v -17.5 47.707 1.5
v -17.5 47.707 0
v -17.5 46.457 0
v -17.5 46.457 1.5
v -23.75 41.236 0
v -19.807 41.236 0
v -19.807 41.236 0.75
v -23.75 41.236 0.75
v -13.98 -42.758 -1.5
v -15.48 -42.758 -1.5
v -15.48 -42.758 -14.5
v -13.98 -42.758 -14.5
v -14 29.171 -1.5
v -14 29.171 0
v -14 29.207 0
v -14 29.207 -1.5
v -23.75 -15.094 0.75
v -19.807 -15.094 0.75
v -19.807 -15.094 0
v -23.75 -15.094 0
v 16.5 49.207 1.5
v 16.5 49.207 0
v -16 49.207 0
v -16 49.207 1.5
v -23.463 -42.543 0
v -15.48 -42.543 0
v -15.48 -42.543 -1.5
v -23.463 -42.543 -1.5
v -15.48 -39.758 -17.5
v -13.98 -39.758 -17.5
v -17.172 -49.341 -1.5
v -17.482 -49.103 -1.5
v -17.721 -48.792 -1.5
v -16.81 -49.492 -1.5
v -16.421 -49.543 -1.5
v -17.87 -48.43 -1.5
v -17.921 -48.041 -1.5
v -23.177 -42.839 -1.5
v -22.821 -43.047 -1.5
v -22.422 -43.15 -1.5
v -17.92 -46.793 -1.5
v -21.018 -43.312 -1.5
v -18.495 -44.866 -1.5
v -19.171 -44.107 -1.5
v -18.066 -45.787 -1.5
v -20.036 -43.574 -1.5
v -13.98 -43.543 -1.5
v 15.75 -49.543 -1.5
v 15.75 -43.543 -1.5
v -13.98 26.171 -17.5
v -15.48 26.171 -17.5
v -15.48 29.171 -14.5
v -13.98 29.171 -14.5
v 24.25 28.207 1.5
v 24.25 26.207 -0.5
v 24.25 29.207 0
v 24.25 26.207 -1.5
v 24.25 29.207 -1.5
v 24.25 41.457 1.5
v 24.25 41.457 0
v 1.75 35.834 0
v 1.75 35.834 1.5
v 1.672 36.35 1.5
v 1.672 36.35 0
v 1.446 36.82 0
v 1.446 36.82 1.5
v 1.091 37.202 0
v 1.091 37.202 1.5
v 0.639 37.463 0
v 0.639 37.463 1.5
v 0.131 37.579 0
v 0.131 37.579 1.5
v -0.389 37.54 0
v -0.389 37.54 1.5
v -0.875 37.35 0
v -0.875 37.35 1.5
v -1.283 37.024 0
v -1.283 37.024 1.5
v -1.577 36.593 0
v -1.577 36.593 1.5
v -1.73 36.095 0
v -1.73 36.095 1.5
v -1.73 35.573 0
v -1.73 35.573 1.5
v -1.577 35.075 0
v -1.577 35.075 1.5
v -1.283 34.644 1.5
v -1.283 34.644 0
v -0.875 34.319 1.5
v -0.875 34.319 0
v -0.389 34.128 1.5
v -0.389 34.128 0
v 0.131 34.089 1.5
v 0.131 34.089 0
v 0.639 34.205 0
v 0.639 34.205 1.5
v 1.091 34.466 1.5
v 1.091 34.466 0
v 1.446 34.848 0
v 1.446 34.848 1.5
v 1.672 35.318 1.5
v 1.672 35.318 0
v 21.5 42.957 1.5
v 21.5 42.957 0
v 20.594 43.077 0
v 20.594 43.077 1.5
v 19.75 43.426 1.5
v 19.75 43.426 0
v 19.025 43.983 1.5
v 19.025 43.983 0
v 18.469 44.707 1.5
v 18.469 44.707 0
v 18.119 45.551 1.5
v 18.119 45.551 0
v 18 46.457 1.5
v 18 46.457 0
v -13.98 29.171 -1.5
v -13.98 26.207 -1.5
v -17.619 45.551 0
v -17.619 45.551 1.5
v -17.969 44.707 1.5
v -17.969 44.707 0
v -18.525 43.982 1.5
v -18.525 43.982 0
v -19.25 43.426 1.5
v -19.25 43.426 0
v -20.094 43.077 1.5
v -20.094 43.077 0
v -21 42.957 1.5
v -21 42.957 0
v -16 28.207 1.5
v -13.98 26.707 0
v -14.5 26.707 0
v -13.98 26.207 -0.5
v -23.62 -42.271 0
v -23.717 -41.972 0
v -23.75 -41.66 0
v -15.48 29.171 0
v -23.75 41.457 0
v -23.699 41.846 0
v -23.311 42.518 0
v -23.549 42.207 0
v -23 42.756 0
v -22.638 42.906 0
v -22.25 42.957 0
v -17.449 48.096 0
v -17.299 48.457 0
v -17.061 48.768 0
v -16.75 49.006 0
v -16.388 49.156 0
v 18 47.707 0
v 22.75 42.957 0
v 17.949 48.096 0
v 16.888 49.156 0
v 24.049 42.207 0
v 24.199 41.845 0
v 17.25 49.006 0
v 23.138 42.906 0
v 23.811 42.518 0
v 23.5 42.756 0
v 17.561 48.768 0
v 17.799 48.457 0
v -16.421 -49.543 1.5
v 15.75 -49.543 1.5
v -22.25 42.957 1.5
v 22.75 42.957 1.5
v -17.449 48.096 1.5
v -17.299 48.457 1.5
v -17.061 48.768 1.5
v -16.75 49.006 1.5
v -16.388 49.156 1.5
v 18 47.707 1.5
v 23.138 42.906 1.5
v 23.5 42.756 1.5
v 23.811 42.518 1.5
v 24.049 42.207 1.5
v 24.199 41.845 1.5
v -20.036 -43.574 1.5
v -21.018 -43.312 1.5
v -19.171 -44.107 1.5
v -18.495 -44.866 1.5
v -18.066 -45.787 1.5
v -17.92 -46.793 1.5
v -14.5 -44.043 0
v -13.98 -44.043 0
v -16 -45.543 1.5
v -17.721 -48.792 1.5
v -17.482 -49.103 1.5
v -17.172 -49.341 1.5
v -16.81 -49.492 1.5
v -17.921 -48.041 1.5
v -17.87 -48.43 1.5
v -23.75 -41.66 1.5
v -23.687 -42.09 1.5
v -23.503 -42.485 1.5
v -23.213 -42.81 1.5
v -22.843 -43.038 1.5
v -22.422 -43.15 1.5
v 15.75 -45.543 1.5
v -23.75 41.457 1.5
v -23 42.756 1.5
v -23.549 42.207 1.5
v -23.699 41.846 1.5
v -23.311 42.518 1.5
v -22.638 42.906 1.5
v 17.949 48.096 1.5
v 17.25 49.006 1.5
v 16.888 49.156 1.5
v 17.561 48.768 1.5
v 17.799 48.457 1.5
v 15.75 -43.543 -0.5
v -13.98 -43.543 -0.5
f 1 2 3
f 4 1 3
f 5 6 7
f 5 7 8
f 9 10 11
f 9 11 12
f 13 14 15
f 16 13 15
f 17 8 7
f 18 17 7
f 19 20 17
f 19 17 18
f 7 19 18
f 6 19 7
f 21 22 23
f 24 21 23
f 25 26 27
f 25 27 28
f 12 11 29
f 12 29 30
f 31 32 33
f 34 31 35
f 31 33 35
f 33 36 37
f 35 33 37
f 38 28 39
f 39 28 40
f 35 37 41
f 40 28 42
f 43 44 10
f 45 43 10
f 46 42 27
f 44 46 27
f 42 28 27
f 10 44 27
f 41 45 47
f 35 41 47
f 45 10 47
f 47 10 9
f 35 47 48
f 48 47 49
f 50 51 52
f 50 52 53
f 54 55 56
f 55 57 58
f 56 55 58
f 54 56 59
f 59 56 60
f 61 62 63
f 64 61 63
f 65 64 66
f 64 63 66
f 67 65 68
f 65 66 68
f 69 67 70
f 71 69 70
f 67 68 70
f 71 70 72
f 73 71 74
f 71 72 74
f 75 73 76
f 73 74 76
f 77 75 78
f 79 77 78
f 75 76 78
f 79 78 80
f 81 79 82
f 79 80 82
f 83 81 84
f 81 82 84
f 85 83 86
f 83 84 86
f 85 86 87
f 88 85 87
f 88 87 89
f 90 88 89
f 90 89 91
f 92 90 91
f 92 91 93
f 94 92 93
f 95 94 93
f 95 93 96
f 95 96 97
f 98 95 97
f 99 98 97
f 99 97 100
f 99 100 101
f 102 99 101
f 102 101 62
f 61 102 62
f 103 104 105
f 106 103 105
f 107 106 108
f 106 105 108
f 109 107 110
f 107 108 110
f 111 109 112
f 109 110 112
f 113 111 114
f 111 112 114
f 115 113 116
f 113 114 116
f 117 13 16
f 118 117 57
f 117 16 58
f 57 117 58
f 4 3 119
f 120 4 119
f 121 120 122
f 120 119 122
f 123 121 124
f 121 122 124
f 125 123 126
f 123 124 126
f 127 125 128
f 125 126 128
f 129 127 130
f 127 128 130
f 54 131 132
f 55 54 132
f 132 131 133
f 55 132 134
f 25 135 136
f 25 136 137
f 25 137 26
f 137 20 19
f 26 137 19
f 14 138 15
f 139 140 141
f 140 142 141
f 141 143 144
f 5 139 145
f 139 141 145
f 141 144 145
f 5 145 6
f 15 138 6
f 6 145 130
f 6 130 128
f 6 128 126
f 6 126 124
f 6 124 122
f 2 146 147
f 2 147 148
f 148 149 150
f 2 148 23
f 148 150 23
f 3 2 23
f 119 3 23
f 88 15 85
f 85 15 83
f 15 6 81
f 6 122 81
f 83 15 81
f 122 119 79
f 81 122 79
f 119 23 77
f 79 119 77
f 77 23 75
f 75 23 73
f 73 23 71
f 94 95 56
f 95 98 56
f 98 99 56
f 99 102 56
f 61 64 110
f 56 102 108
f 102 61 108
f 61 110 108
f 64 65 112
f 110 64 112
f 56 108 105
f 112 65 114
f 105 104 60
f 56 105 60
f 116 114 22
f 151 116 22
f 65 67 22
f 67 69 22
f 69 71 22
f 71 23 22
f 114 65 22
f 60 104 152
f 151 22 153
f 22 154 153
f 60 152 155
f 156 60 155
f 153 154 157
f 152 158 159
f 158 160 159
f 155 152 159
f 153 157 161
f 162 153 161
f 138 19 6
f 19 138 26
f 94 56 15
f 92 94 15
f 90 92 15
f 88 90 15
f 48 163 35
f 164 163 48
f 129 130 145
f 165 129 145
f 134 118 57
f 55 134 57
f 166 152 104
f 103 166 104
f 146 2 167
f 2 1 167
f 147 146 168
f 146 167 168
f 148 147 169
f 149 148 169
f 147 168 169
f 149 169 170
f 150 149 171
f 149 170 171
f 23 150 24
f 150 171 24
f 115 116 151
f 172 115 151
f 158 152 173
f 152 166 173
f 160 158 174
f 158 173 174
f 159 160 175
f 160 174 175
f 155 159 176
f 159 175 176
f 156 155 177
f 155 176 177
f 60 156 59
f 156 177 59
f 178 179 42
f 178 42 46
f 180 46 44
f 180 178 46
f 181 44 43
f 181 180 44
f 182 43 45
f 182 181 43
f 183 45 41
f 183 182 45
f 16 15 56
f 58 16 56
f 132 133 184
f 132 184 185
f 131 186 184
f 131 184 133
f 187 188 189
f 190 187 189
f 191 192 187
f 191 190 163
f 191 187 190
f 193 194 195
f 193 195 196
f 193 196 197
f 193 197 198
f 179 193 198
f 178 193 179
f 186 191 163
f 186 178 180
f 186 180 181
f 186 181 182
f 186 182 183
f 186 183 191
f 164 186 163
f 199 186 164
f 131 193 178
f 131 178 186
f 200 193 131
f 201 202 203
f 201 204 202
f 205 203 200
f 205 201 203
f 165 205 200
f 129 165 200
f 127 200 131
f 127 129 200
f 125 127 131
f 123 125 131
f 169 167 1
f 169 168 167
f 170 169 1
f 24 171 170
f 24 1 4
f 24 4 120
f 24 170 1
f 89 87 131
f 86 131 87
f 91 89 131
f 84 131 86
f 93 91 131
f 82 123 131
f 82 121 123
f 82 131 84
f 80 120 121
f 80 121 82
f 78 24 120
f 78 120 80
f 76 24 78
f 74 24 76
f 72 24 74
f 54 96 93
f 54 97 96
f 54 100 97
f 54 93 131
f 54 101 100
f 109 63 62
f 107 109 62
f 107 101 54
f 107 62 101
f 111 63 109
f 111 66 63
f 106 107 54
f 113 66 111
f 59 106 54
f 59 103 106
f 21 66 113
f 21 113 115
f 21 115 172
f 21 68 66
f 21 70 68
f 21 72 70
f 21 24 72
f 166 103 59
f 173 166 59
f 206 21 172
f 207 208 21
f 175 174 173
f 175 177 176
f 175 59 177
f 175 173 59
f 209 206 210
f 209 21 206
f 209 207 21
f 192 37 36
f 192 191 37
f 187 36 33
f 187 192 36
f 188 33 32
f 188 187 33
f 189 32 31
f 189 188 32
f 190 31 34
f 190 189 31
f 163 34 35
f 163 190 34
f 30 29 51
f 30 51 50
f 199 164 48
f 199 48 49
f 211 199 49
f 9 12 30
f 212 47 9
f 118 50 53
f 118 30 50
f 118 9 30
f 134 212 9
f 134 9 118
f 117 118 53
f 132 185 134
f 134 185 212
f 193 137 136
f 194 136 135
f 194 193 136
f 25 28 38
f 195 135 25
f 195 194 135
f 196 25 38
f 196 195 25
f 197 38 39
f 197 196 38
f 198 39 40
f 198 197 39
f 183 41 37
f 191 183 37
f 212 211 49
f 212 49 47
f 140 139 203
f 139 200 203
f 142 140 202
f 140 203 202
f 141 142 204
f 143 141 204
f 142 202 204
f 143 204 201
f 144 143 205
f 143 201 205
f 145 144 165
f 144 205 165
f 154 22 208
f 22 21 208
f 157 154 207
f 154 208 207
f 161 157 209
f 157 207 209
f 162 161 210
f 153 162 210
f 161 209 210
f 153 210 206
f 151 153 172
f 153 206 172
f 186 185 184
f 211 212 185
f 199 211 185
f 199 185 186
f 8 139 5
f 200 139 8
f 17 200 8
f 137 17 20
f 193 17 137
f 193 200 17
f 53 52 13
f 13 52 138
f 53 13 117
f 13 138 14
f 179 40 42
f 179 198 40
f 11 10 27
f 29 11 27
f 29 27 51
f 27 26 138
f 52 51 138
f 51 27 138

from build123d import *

# Parameters (mm, degrees)
F0_W          = 38.25
F0_H          = 3
F1_DEPTH      = 1.5
F2_DEPTH      = 1.5
F5_DEPTH      = 0.75
F6_R          = 1.5
F7_W          = 1.5
F7_H          = 71.928761142
F8_DEPTH      = 17.5
F10_SIZE      = 3
F13_R         = 1.75
F14_DEPTH     = 25
F15_DEPTH     = 1
F16_T4_DEPTH  = 48.5367319519
F16_T10_DEPTH = 48.5367319519
F16_T15_DEPTH = 80.0367319519
F16_T22_DEPTH = 40.0367319519
F16_T27_DEPTH = 40.0367319519


# Not quite as in the source:
# - a fillet or chamfer that OpenCascade refuses, or shapes differently, is made with other operations: its cross-section is extruded or revolved along the edge and cut away or added


with BuildPart() as f1:
    # F0 (on Top) → F1 (new body)
    with BuildSketch(Plane.XY):
        with BuildLine():
            Line((-14, -42.5426968038), (-23.75, -42.5426968038))
            Line((-23.75, -42.5426968038), (-23.75, -42.9965845553))
            Line((-23.75, -42.9965845553), (-21.0181723213, -43.3122070099))
            ThreePointArc((-21.0181723213, -43.3122070099), (-18.8056300503, -44.4619063855), (-17.919875499, -46.7926982744))
            Line((-17.919875499, -46.7926982744), (-17.9227195281, -49.5426968038))
            Line((-17.9227195281, -49.5426968038), (15.75, -49.5426968038))
            Line((15.75, -49.5426968038), (15.75, -42.5426968038))
            Line((15.75, -42.5426968038), (-14, -42.5426968038))
        make_face()
        with BuildLine():
            Line((18, 49.2073031962), (-17.5, 49.2073031962))
            Line((-17.5, 49.2073031962), (-17.5, 46.4573031962))
            ThreePointArc((-17.5, 46.4573031962), (-18.5251262658, 43.982429462), (-21, 42.9573031962))
            Line((-21, 42.9573031962), (-23.75, 42.9573031962))
            Line((-23.75, 42.9573031962), (-23.75, -42.5426968038))
            Line((-23.75, -42.5426968038), (-14, -42.5426968038))
            Line((-14, -42.5426968038), (-14, 26.2073031962))
            Line((-14, 26.2073031962), (-14, 29.2073031962))
            Line((-14, 29.2073031962), (24.25, 29.2073031962))
            Line((24.25, 29.2073031962), (24.25, 42.9570424259))
            Line((24.25, 42.9570424259), (21.4996681305, 42.9573032119))
            ThreePointArc((21.4996681305, 42.9573032119), (19.0250089351, 43.9825467984), (18, 46.4573031962))
            Line((18, 46.4573031962), (18, 49.2073031962))
        make_face()
        with Locations((5.125, 27.7073031962)):
            Rectangle(F0_W, F0_H)
    extrude(amount=F1_DEPTH)

    # F0 (on Top) → F2 (join)
    with BuildSketch(Plane.XY):
        with BuildLine():
            Line((-14, -42.5426968038), (-23.75, -42.5426968038))
            Line((-23.75, -42.5426968038), (-23.75, -42.9965845553))
            Line((-23.75, -42.9965845553), (-21.0181723213, -43.3122070099))
            ThreePointArc((-21.0181723213, -43.3122070099), (-18.8056300503, -44.4619063855), (-17.919875499, -46.7926982744))
            Line((-17.919875499, -46.7926982744), (-17.9227195281, -49.5426968038))
            Line((-17.9227195281, -49.5426968038), (15.75, -49.5426968038))
            Line((15.75, -49.5426968038), (15.75, -42.5426968038))
            Line((15.75, -42.5426968038), (-14, -42.5426968038))
        make_face()
        with Locations((5.125, 27.7073031962)):
            Rectangle(F0_W, F0_H)
    extrude(amount=-F2_DEPTH)

    # F3: union 

    # F4 (on face) → F5 (cut)
    with BuildSketch(Plane.XY):
        Polygon((-19.8072306812, 41.2358827889), (-27.7905139636, 41.2358827889), (-27.9461211857, -15.0937307626), (-19.8072306812, -15.0937307626), align=None)
    extrude(amount=F5_DEPTH, mode=Mode.SUBTRACT)

    # F6
    f6_edges = [f1.edges().sort_by_distance(p)[0] for p in [
        (-17.5, 49.207303, 0.75),
        (-23.75, 42.957303, 0.75),
        (18, 49.207303, 0.75),
        (24.25, 42.957042, 0.75),
        (-23.75, -42.996585, 0),
        (-17.92272, -49.542697, 0),
    ]]
    fillet(f6_edges, radius=F6_R)

    # F7 (on Top) → F8 (join)
    with BuildSketch(Plane.XY):
        with Locations((-14.7299332246, -6.7935563562)):
            Rectangle(F7_W, F7_H)
    extrude(amount=-F8_DEPTH)

    # F9: union 

    # F10
    f10_edges = [f1.edges().sort_by_distance(p)[0] for p in [
        (-14.729933, -42.757937, -17.5),
        (-14.729933, 29.170824, -17.5),
    ]]
    chamfer(f10_edges, length=F10_SIZE)


with BuildPart() as f11_1:
    # F11: copy of F1
    add(f1.part)


with BuildPart() as f1_1:
    add(f1.part)

    # F13 (on face) → F14 (cut)
    with BuildSketch(Plane.XY.offset(1.5)):
        with Locations((5.438e-07, 35.8340851963)):
            Circle(F13_R)
    extrude(amount=-F14_DEPTH, mode=Mode.SUBTRACT)

    # F15 (cut): a face of the model
    f15_faces = [f1_1.faces().sort_by_distance(p)[0] for p in [
        (0.8800150014, -42.5426968038, 0.0002530279),
    ]]
    extrude(f15_faces, amount=-F15_DEPTH, mode=Mode.SUBTRACT)

    # F16: chamfer of 2 on 3 edges, made by hand


with BuildPart() as f16_tool2:
    # F16_s3 → F16_t4 (new body)
    with BuildSketch(Plane.YZ.offset(-19.1433659759)):
        Polygon((28.2073031962, 1.5), (26.2073031962, -0.5), (26.2073031962, 1.5), align=None)
    extrude(amount=F16_T4_DEPTH)

    split(bisect_by=Plane.XY, keep=Keep.TOP)

    split(bisect_by=Plane(origin=(-7.25, 0, -7.25), x_dir=(0, 1, 0), z_dir=(0.7071067812, 0, 0.7071067812)), keep=Keep.TOP)


with BuildPart() as f1_2:
    add(f1_1.part)

    # F16_t1: cut F16_tool2
    add(f16_tool2.part, mode=Mode.SUBTRACT)


with BuildPart() as f16_tool8:
    # F16_s9 → F16_t10 (new body)
    with BuildSketch(Plane.YZ.offset(-19.1433659759)):
        Polygon((28.2073031962, 1.5), (26.2073031962, -0.5), (26.2073031962, 1.5), align=None)
    extrude(amount=F16_T10_DEPTH)

    split(bisect_by=Plane.YZ.offset(-13.9799332246), keep=Keep.TOP)


with BuildPart() as f1_3:
    add(f1_2.part)

    # F16_t7: cut F16_tool8
    add(f16_tool8.part, mode=Mode.SUBTRACT)


with BuildPart() as f16_tool13:
    # F16_s14 → F16_t15 (new body)
    with BuildSketch(Plane.XZ.offset(48.6860627797)):
        Polygon((-14, -0.5), (-16, 1.5), (-14, 1.5), align=None)
    extrude(amount=-F16_T15_DEPTH)

    split(bisect_by=Plane.XY, keep=Keep.TOP)

    split(bisect_by=Plane(origin=(0, 13.3536515981, -13.3536515981), x_dir=(1, 0, 0), z_dir=(0, -0.7071067812, 0.7071067812)), keep=Keep.TOP)

    split(bisect_by=Plane(origin=(0, -22.0213484019, -22.0213484019), x_dir=(1, 0, 0), z_dir=(0, 0.7071067812, 0.7071067812)), keep=Keep.TOP)


with BuildPart() as f1_4:
    add(f1_3.part)

    # F16_t12: cut F16_tool13
    add(f16_tool13.part, mode=Mode.SUBTRACT)


with BuildPart() as f16_tool20:
    # F16_s21 → F16_t22 (new body)
    with BuildSketch(Plane.YZ.offset(20.8933659759)):
        Polygon((-43.5426968038, -0.5), (-45.5426968038, 1.5), (-43.5426968038, 1.5), align=None)
    extrude(amount=-F16_T22_DEPTH)

    split(bisect_by=Plane.YZ.offset(-13.9799332246), keep=Keep.TOP)


with BuildPart() as f1_5:
    add(f1_4.part)

    # F16_t19: cut F16_tool20
    add(f16_tool20.part, mode=Mode.SUBTRACT)


with BuildPart() as f16_tool25:
    # F16_s26 → F16_t27 (new body)
    with BuildSketch(Plane.YZ.offset(20.8933659759)):
        Polygon((-43.5426968038, -0.5), (-45.5426968038, 1.5), (-43.5426968038, 1.5), align=None)
    extrude(amount=-F16_T27_DEPTH)

    split(bisect_by=Plane.XY, keep=Keep.TOP)

    split(bisect_by=Plane(origin=(-7.25, 0, -7.25), x_dir=(0, 1, 0), z_dir=(0.7071067812, 0, 0.7071067812)), keep=Keep.TOP)


with BuildPart() as f1_6:
    add(f1_5.part)

    # F16_t24: cut F16_tool25
    add(f16_tool25.part, mode=Mode.SUBTRACT)


solid = f1_6.part
